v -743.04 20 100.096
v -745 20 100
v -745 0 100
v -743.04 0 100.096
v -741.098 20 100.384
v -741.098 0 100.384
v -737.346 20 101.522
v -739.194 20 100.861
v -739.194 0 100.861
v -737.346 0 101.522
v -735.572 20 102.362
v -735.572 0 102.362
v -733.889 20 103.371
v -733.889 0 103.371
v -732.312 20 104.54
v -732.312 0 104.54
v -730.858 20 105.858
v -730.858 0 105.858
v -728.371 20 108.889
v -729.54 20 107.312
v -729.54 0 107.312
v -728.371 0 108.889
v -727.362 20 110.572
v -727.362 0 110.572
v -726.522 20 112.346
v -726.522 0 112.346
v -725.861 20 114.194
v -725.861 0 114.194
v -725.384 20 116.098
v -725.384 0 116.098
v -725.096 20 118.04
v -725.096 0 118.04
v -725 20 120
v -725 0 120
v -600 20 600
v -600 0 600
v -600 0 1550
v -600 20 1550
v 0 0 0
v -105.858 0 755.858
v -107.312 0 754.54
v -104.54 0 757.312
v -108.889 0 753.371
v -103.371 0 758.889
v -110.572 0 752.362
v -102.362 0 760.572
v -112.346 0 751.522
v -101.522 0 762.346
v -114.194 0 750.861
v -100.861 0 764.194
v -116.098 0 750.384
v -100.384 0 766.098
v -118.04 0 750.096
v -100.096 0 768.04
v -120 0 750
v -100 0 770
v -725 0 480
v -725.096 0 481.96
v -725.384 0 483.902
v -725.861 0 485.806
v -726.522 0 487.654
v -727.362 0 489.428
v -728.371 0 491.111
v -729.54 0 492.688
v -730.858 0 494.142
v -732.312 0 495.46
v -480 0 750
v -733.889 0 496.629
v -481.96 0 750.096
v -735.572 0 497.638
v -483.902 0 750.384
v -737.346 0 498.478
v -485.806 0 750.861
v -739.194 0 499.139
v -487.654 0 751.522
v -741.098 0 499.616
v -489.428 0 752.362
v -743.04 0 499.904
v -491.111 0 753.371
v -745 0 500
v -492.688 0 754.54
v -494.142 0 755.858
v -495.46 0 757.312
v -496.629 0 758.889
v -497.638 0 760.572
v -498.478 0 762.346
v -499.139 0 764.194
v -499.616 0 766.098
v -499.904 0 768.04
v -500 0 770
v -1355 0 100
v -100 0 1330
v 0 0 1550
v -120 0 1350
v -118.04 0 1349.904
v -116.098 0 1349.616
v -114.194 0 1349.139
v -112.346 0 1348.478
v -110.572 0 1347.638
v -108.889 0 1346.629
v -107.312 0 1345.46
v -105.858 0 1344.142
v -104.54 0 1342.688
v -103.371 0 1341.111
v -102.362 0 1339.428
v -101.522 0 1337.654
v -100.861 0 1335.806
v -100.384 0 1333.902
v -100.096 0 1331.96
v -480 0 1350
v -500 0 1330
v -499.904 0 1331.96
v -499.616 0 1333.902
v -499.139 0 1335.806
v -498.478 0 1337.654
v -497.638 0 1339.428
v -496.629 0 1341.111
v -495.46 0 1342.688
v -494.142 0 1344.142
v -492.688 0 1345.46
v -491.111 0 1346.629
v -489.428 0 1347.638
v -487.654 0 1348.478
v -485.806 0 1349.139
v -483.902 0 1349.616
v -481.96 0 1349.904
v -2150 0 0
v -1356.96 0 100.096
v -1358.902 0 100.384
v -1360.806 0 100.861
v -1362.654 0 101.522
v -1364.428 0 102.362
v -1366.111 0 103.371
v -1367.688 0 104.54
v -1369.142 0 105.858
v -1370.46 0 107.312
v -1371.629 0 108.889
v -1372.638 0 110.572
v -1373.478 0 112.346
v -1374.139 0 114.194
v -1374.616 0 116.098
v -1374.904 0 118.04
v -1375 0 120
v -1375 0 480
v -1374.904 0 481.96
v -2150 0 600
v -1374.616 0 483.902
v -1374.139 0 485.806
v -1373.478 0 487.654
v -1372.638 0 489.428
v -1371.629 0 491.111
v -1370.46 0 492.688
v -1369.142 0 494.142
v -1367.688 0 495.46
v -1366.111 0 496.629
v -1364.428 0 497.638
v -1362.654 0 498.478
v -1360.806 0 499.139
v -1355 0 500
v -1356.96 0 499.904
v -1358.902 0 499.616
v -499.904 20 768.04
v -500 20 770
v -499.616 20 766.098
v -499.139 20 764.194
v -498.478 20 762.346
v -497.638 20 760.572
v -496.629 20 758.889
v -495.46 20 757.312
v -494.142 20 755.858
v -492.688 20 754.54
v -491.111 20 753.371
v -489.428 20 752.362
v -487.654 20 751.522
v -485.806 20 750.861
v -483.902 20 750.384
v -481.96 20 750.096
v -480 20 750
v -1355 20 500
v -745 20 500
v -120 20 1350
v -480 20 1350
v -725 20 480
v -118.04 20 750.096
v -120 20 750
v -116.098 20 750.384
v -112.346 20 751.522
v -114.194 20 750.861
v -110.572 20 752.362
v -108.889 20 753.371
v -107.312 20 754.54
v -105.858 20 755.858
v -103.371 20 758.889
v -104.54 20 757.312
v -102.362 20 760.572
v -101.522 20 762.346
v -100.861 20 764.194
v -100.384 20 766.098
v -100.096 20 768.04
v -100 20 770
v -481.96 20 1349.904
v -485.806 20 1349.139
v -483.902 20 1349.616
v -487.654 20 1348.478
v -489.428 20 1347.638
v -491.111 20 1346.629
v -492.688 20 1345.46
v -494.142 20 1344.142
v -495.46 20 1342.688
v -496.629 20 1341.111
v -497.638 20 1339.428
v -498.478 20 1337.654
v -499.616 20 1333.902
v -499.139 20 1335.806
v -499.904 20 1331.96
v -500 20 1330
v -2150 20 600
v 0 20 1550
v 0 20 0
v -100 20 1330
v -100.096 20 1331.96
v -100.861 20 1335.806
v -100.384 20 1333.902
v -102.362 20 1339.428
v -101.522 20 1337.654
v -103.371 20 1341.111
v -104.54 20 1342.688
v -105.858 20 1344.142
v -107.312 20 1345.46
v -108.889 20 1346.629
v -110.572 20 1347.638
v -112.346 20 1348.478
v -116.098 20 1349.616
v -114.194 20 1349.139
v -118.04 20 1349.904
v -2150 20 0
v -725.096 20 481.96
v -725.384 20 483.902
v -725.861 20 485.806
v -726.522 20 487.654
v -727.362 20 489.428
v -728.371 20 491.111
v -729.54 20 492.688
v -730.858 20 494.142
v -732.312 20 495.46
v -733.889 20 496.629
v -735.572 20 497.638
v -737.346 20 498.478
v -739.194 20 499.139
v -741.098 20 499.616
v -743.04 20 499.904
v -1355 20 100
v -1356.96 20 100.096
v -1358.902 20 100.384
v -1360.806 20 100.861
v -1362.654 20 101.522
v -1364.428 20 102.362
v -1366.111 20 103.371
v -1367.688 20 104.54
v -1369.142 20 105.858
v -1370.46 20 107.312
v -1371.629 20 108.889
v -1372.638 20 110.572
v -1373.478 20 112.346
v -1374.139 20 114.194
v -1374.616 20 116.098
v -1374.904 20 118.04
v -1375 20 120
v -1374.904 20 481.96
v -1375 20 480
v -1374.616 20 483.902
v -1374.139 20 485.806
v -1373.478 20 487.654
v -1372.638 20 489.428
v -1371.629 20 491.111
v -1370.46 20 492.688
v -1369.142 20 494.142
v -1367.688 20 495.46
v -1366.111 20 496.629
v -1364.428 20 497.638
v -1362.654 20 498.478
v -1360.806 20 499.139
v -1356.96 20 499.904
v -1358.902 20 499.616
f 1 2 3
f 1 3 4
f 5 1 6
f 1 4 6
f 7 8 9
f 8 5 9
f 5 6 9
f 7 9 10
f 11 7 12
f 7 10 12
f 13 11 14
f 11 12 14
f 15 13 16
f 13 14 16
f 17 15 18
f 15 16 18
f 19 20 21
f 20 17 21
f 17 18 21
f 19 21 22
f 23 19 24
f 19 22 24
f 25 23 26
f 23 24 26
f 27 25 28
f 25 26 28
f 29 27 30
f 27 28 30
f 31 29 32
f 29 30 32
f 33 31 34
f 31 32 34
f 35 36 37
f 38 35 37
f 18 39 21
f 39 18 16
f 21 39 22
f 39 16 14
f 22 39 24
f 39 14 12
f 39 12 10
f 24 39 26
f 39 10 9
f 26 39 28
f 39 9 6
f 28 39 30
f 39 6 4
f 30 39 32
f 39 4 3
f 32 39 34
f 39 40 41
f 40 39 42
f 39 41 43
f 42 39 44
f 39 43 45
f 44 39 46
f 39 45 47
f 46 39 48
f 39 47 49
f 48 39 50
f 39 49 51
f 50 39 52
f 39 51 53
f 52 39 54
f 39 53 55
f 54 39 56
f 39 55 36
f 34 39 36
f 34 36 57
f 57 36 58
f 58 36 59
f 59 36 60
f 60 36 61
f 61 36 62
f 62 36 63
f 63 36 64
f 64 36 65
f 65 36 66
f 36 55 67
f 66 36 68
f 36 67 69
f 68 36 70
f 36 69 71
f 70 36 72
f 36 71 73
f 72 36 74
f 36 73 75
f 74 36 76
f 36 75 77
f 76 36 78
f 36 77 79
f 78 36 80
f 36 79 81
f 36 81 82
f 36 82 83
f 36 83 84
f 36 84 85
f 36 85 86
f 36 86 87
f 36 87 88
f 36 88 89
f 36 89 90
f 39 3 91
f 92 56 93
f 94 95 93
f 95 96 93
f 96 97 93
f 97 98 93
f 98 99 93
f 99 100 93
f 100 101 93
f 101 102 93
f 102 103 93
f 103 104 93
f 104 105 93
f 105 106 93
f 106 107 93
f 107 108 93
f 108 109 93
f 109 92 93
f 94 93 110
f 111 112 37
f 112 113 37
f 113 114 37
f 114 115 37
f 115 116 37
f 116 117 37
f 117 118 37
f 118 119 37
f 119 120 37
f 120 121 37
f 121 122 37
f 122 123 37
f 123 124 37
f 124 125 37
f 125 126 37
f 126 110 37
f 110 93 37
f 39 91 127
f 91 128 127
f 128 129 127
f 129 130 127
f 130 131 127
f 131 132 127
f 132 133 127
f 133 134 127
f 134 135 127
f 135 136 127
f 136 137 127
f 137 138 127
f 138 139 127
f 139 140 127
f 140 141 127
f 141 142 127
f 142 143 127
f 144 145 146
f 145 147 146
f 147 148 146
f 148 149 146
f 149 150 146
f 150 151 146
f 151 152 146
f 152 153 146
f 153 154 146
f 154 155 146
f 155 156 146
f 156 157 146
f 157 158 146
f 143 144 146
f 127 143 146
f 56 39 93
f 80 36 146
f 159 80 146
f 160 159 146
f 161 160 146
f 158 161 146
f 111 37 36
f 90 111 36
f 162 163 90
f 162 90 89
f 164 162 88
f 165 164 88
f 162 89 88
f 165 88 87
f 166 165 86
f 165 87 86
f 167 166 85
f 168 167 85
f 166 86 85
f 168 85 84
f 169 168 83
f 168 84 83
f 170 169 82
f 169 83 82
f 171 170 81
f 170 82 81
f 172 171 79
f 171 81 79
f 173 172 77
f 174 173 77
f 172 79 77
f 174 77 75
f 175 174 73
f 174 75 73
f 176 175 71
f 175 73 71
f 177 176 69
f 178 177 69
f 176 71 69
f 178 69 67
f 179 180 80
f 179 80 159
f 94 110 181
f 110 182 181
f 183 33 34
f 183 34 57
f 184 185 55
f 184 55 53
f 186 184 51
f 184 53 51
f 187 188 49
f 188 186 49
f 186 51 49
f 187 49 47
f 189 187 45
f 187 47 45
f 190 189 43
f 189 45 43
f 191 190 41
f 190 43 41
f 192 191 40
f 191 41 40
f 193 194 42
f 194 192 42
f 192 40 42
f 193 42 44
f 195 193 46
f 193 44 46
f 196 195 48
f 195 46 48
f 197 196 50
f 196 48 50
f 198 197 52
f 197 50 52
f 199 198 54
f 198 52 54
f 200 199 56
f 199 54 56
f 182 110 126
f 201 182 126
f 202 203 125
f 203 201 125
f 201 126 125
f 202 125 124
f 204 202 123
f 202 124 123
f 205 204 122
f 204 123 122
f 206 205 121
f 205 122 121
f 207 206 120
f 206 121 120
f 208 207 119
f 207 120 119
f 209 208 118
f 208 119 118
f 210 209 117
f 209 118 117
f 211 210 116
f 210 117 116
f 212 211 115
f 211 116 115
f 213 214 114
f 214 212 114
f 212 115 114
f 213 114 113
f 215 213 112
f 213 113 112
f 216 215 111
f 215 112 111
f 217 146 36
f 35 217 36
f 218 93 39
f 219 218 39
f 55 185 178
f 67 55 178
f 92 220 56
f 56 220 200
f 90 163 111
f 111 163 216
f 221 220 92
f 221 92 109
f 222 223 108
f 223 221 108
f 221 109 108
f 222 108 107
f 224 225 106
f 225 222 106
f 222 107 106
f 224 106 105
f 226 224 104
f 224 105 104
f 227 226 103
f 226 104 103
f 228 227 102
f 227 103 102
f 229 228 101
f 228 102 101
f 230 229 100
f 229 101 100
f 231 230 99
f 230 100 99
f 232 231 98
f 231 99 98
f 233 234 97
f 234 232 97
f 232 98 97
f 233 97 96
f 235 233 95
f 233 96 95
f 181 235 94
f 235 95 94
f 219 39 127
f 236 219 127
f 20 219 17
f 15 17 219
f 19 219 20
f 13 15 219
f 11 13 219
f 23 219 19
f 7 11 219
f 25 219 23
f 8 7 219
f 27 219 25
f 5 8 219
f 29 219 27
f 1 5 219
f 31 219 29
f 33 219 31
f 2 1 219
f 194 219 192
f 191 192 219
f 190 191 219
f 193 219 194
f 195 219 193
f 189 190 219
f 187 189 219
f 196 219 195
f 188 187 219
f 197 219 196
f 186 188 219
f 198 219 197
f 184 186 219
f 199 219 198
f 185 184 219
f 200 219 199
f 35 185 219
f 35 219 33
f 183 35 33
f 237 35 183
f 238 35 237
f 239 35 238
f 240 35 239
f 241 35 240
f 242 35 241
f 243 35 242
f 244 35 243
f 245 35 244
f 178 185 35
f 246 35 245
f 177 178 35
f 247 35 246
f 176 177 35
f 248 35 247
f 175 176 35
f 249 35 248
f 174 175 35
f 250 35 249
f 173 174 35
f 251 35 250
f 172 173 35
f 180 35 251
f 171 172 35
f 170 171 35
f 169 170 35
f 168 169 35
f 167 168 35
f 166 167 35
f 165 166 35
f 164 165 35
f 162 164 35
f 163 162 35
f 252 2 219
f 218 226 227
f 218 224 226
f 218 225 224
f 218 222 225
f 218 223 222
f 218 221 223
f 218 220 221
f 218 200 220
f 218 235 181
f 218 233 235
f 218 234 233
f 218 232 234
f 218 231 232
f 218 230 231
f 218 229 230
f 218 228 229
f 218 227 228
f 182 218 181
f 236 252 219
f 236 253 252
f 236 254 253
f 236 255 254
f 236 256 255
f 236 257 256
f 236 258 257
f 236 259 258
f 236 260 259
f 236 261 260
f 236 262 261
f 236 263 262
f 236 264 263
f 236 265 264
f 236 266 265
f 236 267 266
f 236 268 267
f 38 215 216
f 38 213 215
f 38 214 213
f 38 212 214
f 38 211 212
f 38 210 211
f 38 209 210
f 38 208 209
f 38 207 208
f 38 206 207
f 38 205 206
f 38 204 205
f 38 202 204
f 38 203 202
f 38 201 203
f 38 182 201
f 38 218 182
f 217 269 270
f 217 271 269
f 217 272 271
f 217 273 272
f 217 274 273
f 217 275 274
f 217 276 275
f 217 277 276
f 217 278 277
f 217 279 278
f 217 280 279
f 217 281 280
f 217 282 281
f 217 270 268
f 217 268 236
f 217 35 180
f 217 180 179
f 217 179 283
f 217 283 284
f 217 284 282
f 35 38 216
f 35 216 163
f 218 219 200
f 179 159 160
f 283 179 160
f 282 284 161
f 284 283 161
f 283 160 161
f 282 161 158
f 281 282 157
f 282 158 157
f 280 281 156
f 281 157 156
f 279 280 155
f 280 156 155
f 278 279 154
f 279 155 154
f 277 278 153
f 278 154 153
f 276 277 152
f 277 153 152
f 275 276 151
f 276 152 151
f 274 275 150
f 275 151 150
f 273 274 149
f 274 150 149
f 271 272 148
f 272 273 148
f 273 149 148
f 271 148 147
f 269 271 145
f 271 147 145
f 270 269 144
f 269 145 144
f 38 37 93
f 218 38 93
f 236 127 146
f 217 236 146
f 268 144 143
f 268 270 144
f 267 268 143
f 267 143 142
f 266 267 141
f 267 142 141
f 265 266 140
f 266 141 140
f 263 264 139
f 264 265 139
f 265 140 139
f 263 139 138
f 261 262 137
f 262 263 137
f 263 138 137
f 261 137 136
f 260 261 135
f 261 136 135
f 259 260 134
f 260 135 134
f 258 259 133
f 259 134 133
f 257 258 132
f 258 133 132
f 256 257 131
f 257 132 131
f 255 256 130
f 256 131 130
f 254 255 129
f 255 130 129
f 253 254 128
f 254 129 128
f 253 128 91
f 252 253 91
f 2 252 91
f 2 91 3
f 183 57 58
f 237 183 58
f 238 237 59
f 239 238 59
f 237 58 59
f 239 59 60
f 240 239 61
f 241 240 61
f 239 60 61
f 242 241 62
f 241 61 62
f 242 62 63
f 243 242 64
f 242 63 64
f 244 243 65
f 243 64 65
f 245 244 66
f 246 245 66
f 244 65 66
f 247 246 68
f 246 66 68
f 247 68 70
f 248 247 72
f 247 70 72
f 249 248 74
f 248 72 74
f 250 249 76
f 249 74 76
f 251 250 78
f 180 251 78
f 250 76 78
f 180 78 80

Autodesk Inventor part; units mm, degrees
ref_plane "YZ Plane" through (0, 0, 0) normal (1, 0, 0) x (0, 1, 0)
ref_plane "XZ Plane" through (0, 0, 0) normal (0, 1, 0) x (-1, 0, 0)
ref_plane "XY Plane" through (0, 0, 0) normal (0, 0, 1) x (1, 0, 0)
sketch "Sketch1" plane through (0, 0, 0) normal (0, 1, 0) x (-1, 0, 0)
  line L0 (0, 0) -> (2150, 0)
  line L1 (2150, 0) -> (2150, 600)
  line L2 (2150, 600) -> (600, 600)
  line L3 (600, 600) -> (600, 1550)
  line L4 (600, 1550) -> (0, 1550)
  line L5 (0, 1550) -> (0, 0)
  dimension "d0" = 2150
  dimension "d1" = 600
  dimension "d2" = 1550
extrude "Extrusion1" add sketch "Sketch1" along normal blind 20
sketch "Sketch2" plane through (0, 20, 0) normal (0, 1, 0) x (1, 0, 0)
  line L0 (-725, -500) -> (-1375, -500)
  line L1 (-1375, -500) -> (-1375, -100)
  line L2 (-1375, -100) -> (-725, -100)
  line L3 (-725, -100) -> (-725, -500)
  line L4 (-725, -500) -> (-1375, -100) construction
  line L5 (-1375, -500) -> (-725, -100) construction
  line L6 (-2150, 0) -> (-2150, -600) projected
  line L7 (0, 0) -> (-2150, 0) projected
  line L8 (-500, -1350) -> (-100, -1350)
  line L9 (-100, -1350) -> (-100, -750)
  line L10 (-100, -750) -> (-500, -750)
  line L11 (-500, -750) -> (-500, -1350)
  line L12 (-500, -1350) -> (-100, -750) construction
  line L13 (-100, -1350) -> (-500, -750) construction
  line L14 (-600, -1550) -> (0, -1550) projected
  line L15 (0, -1550) -> (0, 0) projected
  point P0 (-1050, -300)
  point P1 (-300, -1050)
  dimension "d5" = 650
  dimension "d6" = 400
  dimension "d8" = 300
  dimension "d9" = 400
  dimension "d10" = 600
  dimension "d12" = 300
  dimension "d16" = 1050
  dimension "d17" = 1050
extrude "Extrusion2" cut sketch "Sketch2" against normal through all
fillet "Fillet1" radius 20 8 edges at (-725, 10, 500) (-725, 10, 100) (-1375, 10, 100) (-1375, 10, 500) (-500, 10, 1350) (-100, 10, 1350) (-100, 10, 750) (-500, 10, 750)
properties part number "Top cucina"
